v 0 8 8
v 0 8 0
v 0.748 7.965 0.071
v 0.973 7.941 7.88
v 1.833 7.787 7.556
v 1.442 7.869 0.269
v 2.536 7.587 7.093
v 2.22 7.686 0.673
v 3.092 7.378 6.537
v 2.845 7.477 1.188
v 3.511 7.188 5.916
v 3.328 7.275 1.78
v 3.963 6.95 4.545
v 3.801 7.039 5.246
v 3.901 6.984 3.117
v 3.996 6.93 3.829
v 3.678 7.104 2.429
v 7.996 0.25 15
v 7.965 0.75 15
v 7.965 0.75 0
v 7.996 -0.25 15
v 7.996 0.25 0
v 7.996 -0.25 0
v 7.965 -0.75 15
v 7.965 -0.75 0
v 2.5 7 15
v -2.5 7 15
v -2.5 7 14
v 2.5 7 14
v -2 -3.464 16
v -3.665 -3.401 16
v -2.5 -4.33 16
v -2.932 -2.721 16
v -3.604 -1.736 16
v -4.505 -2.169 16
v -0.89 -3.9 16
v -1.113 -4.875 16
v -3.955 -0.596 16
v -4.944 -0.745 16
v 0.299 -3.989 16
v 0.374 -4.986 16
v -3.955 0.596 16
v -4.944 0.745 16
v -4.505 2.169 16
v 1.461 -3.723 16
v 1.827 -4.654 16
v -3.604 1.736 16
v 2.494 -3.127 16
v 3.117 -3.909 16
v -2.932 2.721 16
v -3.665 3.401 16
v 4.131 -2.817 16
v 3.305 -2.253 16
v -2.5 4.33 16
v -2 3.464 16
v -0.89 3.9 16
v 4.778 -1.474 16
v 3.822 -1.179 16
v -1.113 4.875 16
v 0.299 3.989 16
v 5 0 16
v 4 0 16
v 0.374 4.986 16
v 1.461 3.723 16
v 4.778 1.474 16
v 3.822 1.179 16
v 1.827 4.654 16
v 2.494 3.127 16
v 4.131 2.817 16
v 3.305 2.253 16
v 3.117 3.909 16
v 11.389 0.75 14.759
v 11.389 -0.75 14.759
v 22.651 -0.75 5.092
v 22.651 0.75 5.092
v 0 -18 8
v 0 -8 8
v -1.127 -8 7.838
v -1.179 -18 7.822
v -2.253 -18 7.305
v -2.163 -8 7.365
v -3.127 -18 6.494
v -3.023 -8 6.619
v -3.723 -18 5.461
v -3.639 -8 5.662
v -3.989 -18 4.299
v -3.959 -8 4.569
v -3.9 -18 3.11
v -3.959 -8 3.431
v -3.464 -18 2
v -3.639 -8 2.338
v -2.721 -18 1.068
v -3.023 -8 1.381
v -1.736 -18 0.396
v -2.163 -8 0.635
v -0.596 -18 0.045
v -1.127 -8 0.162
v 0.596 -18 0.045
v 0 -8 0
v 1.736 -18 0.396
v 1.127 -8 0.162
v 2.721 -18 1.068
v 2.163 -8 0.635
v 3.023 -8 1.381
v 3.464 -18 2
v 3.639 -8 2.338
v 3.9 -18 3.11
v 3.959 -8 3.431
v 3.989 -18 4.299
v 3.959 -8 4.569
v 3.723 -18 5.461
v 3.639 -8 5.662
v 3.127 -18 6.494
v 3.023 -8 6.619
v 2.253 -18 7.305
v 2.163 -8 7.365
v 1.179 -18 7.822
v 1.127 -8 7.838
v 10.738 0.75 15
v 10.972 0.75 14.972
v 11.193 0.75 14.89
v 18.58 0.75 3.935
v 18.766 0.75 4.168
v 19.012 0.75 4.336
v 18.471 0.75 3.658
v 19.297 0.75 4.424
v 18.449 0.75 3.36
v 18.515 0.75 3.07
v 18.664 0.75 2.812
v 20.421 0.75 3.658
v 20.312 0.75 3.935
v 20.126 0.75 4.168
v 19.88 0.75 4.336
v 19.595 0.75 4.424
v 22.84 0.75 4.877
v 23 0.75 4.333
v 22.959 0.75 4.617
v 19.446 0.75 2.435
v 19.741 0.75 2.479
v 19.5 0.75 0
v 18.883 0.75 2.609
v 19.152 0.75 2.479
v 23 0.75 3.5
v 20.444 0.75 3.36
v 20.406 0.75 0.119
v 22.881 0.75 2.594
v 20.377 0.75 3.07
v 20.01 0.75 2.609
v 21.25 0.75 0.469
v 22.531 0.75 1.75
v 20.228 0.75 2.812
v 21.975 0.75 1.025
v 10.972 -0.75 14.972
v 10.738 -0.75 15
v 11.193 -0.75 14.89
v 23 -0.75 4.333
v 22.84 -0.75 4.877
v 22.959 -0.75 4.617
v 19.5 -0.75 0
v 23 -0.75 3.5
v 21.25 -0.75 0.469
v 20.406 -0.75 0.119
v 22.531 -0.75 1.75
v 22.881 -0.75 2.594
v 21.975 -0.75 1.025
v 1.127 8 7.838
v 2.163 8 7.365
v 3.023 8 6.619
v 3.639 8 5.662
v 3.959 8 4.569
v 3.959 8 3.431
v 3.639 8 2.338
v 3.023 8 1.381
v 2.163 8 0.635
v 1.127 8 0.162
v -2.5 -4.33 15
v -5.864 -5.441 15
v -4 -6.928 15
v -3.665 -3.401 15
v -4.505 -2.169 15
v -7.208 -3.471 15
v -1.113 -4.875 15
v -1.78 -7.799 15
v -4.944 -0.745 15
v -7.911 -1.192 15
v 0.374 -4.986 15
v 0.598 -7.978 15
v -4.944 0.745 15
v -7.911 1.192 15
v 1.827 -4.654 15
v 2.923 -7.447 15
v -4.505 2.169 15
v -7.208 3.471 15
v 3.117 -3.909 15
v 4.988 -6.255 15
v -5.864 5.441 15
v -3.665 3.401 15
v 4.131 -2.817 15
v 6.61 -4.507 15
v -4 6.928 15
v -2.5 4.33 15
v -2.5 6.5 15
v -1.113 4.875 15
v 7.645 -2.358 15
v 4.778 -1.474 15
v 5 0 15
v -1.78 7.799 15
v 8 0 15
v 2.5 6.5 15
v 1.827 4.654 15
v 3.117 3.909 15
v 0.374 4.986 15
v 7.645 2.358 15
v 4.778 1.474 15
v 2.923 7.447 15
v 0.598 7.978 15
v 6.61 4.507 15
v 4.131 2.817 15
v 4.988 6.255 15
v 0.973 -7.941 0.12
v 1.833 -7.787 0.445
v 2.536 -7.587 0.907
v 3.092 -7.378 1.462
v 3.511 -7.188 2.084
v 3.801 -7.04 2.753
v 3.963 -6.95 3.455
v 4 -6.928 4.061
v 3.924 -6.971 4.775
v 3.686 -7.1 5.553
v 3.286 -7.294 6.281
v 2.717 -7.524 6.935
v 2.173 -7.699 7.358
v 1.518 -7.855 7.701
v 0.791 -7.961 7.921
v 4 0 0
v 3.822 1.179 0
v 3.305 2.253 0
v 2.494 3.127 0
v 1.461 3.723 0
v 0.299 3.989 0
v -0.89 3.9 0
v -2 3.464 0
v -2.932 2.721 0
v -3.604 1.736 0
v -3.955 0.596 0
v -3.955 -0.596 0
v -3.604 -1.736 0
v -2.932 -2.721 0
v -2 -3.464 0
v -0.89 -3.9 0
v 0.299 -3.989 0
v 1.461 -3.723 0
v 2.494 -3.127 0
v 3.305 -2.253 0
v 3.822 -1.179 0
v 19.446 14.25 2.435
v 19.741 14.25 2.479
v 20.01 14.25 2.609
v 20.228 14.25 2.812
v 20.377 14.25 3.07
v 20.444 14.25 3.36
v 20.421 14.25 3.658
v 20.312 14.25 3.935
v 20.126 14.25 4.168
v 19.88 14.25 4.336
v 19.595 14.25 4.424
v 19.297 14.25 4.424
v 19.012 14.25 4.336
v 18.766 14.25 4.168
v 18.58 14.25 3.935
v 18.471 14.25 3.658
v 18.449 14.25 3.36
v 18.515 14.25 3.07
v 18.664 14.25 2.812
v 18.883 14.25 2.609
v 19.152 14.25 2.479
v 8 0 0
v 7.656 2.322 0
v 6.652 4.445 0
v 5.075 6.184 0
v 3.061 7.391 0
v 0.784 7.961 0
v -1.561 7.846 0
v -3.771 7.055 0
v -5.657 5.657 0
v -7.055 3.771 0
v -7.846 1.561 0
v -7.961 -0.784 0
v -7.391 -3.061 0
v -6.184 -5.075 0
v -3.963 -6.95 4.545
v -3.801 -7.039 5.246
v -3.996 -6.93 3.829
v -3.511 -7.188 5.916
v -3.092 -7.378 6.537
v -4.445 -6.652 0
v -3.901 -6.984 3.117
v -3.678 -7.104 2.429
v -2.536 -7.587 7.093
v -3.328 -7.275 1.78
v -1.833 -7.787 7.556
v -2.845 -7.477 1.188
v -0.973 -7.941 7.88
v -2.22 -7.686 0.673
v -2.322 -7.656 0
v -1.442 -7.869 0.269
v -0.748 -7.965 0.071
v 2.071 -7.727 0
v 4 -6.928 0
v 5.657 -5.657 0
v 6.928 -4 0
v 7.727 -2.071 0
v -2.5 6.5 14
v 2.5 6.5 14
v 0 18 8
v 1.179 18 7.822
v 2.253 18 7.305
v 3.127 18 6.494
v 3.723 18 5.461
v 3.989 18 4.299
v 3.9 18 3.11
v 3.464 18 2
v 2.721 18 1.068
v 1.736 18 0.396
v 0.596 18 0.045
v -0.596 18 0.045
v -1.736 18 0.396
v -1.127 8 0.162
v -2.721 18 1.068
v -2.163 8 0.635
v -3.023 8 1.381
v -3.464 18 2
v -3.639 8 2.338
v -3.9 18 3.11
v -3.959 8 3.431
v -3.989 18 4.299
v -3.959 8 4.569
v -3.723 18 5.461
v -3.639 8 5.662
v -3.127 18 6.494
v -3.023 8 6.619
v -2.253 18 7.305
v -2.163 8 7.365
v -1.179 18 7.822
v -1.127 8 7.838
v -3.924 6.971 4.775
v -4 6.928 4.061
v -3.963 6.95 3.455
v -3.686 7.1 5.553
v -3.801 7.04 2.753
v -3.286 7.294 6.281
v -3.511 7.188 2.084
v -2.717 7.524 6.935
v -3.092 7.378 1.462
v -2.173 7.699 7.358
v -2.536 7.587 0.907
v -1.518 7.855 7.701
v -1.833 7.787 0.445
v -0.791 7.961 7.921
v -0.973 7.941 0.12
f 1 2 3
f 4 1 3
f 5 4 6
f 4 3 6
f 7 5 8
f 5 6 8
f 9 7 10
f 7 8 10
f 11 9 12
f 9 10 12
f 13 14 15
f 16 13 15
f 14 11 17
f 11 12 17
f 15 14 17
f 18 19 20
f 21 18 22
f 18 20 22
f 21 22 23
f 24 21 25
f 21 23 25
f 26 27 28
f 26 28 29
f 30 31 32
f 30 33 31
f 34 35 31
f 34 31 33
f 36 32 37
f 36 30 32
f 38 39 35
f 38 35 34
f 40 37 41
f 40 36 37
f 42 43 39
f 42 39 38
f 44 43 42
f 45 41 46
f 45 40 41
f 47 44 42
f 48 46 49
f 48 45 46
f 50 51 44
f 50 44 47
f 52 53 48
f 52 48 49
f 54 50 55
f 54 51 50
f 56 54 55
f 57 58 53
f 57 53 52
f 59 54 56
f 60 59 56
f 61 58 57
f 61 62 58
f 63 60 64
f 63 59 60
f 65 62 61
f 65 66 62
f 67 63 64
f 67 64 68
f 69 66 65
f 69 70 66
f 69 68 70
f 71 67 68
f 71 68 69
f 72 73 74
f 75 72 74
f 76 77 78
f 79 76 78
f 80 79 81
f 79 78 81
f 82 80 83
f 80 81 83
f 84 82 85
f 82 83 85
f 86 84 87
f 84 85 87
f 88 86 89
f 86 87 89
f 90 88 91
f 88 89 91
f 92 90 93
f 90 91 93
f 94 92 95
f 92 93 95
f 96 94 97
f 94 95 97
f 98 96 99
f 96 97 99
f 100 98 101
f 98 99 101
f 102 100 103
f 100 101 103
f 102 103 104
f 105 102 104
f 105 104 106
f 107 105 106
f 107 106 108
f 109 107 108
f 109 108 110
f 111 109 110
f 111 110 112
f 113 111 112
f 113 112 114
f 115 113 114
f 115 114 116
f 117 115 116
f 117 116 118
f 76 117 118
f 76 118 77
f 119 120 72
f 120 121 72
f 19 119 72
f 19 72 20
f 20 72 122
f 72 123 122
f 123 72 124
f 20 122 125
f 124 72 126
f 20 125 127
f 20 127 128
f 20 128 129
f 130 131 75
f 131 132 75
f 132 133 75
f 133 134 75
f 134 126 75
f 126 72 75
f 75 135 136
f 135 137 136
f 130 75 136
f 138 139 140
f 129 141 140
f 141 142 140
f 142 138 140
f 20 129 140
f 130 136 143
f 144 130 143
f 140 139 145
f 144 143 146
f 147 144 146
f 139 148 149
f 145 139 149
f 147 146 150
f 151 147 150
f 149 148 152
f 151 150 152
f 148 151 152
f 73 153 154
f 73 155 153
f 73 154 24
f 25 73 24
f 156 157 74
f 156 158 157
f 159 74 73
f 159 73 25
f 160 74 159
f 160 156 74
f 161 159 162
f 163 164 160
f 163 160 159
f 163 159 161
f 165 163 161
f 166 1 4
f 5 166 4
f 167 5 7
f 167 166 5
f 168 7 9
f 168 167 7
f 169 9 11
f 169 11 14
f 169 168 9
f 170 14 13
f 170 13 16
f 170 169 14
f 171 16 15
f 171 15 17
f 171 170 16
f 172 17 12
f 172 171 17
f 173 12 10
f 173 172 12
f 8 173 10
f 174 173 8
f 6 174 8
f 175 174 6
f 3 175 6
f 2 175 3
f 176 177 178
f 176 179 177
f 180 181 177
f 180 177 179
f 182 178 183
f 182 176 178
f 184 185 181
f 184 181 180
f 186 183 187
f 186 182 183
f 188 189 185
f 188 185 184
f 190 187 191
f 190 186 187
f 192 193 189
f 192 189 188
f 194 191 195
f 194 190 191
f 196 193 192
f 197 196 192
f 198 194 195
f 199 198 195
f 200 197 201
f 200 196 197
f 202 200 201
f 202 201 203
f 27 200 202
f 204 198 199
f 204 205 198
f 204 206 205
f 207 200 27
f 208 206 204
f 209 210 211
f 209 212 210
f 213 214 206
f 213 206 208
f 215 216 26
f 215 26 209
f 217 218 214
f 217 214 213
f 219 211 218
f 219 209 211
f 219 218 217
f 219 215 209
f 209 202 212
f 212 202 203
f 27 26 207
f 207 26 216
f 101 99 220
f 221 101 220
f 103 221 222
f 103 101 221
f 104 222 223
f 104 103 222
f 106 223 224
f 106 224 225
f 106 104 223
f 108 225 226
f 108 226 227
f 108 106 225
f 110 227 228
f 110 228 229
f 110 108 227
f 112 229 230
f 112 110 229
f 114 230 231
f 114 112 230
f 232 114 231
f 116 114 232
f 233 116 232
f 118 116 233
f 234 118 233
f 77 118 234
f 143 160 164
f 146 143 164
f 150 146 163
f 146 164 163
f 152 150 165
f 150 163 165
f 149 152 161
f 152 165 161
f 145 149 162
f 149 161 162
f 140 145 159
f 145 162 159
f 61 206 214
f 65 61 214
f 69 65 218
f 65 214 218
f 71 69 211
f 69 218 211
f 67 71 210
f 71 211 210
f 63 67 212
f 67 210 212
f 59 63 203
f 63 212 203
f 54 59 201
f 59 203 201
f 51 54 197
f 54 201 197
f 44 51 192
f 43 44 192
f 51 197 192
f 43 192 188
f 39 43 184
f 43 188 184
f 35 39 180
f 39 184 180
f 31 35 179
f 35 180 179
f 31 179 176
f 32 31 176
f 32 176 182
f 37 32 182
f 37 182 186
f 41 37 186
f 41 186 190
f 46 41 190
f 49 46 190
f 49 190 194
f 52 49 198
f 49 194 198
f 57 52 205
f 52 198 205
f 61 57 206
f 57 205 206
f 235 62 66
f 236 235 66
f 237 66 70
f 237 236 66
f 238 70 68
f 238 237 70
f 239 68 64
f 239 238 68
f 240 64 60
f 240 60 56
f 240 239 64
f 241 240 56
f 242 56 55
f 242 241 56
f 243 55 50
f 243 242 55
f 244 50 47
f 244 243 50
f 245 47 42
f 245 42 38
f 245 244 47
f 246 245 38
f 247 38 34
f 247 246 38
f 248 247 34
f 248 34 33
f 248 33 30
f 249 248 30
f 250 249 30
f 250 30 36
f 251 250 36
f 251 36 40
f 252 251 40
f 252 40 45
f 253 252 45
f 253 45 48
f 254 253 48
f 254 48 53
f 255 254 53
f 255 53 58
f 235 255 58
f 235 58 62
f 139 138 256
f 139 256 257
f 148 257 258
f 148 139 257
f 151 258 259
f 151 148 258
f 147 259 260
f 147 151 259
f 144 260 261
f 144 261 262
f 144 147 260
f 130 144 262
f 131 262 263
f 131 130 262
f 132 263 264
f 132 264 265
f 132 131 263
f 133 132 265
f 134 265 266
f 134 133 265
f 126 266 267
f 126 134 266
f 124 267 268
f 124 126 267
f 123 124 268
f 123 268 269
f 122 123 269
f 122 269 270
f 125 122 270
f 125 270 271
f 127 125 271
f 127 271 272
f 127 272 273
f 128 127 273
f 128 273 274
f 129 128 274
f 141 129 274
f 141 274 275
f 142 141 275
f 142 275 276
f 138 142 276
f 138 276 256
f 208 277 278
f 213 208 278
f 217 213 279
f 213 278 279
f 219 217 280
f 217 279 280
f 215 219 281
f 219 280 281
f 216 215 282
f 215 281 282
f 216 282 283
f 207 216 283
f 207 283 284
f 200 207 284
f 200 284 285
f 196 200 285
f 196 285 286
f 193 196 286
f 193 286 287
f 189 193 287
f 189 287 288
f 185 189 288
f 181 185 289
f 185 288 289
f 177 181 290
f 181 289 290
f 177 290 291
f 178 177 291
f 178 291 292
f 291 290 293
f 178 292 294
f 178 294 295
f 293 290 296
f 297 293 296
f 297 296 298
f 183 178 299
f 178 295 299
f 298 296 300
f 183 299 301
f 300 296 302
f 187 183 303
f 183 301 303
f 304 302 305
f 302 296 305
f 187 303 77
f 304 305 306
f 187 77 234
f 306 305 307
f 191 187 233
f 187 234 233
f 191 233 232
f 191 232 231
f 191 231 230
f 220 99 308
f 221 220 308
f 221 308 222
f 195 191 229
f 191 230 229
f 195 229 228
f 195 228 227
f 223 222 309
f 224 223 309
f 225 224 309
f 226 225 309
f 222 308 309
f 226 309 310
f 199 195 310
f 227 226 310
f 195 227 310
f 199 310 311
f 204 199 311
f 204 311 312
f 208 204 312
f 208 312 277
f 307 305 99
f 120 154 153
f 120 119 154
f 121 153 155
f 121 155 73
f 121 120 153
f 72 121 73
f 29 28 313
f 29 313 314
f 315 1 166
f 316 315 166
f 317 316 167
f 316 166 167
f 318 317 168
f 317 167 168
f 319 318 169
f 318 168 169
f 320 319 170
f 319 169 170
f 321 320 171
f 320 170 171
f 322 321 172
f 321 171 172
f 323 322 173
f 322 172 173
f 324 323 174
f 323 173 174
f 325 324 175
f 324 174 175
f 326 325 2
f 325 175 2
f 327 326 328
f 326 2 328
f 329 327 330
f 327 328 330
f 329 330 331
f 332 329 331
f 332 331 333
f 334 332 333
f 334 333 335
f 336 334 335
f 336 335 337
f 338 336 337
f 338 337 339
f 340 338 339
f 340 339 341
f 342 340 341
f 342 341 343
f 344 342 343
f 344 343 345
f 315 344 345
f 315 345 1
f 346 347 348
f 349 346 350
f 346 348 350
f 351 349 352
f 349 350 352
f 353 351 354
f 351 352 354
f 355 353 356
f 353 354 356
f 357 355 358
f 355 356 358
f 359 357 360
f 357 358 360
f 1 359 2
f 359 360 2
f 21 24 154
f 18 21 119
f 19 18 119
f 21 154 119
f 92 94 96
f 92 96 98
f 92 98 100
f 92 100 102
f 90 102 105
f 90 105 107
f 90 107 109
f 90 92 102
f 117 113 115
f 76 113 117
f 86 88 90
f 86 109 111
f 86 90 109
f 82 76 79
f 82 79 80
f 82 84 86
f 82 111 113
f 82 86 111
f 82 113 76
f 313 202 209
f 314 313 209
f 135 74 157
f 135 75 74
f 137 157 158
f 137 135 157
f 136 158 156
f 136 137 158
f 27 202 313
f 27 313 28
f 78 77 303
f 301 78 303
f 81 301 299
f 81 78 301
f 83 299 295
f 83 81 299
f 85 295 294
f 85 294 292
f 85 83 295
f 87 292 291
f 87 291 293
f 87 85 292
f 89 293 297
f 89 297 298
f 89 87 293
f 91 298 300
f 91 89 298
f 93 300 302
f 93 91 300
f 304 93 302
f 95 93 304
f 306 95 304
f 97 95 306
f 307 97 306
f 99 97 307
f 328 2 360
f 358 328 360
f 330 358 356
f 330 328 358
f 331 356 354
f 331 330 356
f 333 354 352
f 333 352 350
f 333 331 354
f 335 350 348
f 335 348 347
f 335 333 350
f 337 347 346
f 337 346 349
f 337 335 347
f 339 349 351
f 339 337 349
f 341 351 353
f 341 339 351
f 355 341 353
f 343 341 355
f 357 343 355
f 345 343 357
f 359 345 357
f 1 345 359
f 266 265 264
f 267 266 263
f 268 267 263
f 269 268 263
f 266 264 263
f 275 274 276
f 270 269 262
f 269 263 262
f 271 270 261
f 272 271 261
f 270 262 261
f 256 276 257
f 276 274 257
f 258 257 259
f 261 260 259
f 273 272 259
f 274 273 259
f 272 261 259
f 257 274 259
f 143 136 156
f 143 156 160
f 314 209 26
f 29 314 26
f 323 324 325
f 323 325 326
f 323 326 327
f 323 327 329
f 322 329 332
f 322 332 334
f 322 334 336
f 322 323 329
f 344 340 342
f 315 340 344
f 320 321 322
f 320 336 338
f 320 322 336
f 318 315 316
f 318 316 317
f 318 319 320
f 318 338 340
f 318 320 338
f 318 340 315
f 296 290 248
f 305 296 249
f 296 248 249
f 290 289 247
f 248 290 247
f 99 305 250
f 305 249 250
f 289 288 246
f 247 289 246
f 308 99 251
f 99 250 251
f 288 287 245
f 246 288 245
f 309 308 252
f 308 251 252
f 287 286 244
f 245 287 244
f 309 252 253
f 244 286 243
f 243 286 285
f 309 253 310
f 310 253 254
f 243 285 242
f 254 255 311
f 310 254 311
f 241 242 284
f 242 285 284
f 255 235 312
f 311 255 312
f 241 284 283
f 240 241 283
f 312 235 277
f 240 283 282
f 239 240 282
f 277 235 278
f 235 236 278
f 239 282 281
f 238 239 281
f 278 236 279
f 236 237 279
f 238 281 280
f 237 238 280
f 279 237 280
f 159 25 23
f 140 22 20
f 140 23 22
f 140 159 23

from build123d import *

# Parameters (mm, degrees)
SKETCH1_R                            = 8
BOSS_EXTRUDE1_DEPTH                  = 15
SKETCH2_R                            = 5
SKETCH2_R_2                          = 4
BOSS_EXTRUDE2_DEPTH                  = 1
CUT_EXTRUDE1_START                   = -15
SKETCH3_R                            = 4
CUT_EXTRUDE1_DEPTH                   = 15
SKETCH4_R                            = 4
BOSS_EXTRUDE3_DEPTH                  = 10
BOSS_EXTRUDE3_DIRECTION_2_REACH      = 26
BOSS_EXTRUDE3_DIRECTION_2_END_RADIUS = 8
SKETCH6_R                            = 4
BOSS_EXTRUDE4_DEPTH                  = 10
BOSS_EXTRUDE4_DIRECTION_2_REACH      = 33.559
BOSS_EXTRUDE4_DIRECTION_2_END_RADIUS = 8
SKETCH7_W                            = 15
SKETCH7_H                            = 1.5
BOSS_EXTRUDE5_DEPTH                  = 15
BOSS_EXTRUDE5_DIRECTION_2_REACH      = 30.914
BOSS_EXTRUDE5_DIRECTION_2_END_RADIUS = 8
CUT_EXTRUDE2_DEPTH                   = 15
CUT_EXTRUDE3_DEPTH                   = 15
FILLET1_R                            = 1
FILLET2_R                            = 1
SKETCH12_R                           = 1
BOSS_EXTRUDE6_DEPTH                  = 15
SKETCH14_W                           = 5
SKETCH14_H                           = 0.5
CUT_EXTRUDE4_DEPTH                   = 1


with BuildPart() as part:
    # Sketch1 → Boss-Extrude1 (new body)
    with BuildSketch(Plane.XY):
        Circle(SKETCH1_R)
    extrude(amount=BOSS_EXTRUDE1_DEPTH)

    # Sketch2 → Boss-Extrude2 (add)
    with BuildSketch(Plane.XY.offset(15)):
        Circle(SKETCH2_R)
        Circle(SKETCH2_R_2, mode=Mode.SUBTRACT)
    extrude(amount=BOSS_EXTRUDE2_DEPTH)

    # Sketch3 → Cut-Extrude1 (cut)
    with BuildSketch(Plane.XY.offset(15).offset(CUT_EXTRUDE1_START)):
        Circle(SKETCH3_R)
    extrude(amount=CUT_EXTRUDE1_DEPTH, mode=Mode.SUBTRACT)

    # Sketch6 → Boss-Extrude4 (add)
    with BuildSketch(Plane(origin=(0, -8, 0), x_dir=(-1, 0, 0), z_dir=(0, -1, 0))):
        with Locations(Location((0, -4, 0), (0, 0, 270))):
            Circle(SKETCH6_R)
    extrude(amount=BOSS_EXTRUDE4_DEPTH)

    # Boss-Extrude4 direction 2: up to this cylinder (the profile starts outside it)
    boss_extrude4_direction_2_end = Plane(origin=(0, 0, 4), z_dir=(0, 0, -1)) * Cylinder(BOSS_EXTRUDE4_DIRECTION_2_END_RADIUS, 84.118, mode=Mode.PRIVATE)
    # Sketch6 → Boss-Extrude4 direction 2 (add, up to the surface)
    with BuildSketch(Plane(origin=(0, -8, 0), x_dir=(-1, 0, 0), z_dir=(0, -1, 0)), mode=Mode.PRIVATE) as boss_extrude4_direction_2_sk1:
        with Locations(Location((0, -4, 0), (0, 0, 270))):
            Circle(SKETCH6_R)
    boss_extrude4_direction_2_tool1 = extrude(boss_extrude4_direction_2_sk1.sketch, amount=-BOSS_EXTRUDE4_DIRECTION_2_REACH, mode=Mode.PRIVATE) - boss_extrude4_direction_2_end
    add(boss_extrude4_direction_2_tool1.solids().sort_by_distance((0, -8, 4))[0])
    add(boss_extrude4_direction_2_tool1.solids().sort_by_distance((0, -8, 4))[1])

    # Sketch14 → Cut-Extrude4 (cut)
    with BuildSketch(Plane.XY.offset(15)):
        with Locations((0, 6.75)):
            Rectangle(SKETCH14_W, SKETCH14_H)
    extrude(amount=-CUT_EXTRUDE4_DEPTH, mode=Mode.SUBTRACT)


with BuildPart() as body_2:
    # Sketch4 → Boss-Extrude3 (new body)
    with BuildSketch(Plane(origin=(0, 8, 0), x_dir=(1, 0, 0), z_dir=(0, 1, 0))):
        with Locations(Location((0, -4, 0), (0, 0, 270))):
            Circle(SKETCH4_R)
    extrude(amount=BOSS_EXTRUDE3_DEPTH)

    # Boss-Extrude3 direction 2: up to this cylinder (the profile starts outside it)
    boss_extrude3_direction_2_end = Plane(origin=(0, 0, 4), z_dir=(0, 0, -1)) * Cylinder(BOSS_EXTRUDE3_DIRECTION_2_END_RADIUS, 69, mode=Mode.PRIVATE)
    # Sketch4 → Boss-Extrude3 direction 2 (add, up to the surface)
    with BuildSketch(Plane(origin=(0, 8, 0), x_dir=(1, 0, 0), z_dir=(0, 1, 0)), mode=Mode.PRIVATE) as boss_extrude3_direction_2_sk1:
        with Locations(Location((0, -4, 0), (0, 0, 270))):
            Circle(SKETCH4_R)
    boss_extrude3_direction_2_tool1 = extrude(boss_extrude3_direction_2_sk1.sketch, amount=-BOSS_EXTRUDE3_DIRECTION_2_REACH, mode=Mode.PRIVATE) - boss_extrude3_direction_2_end
    add(boss_extrude3_direction_2_tool1.solids().sort_by_distance((0, 8, 4))[0])
    add(boss_extrude3_direction_2_tool1.solids().sort_by_distance((0, 8, 4))[1])


with BuildPart() as body_3:
    # Sketch7 → Boss-Extrude5 (new body)
    with BuildSketch(Plane(origin=(8, 0, 0), x_dir=(0, 0, -1), z_dir=(1, 0, 0))):
        with Locations((-7.5, 0)):
            Rectangle(SKETCH7_W, SKETCH7_H)
    extrude(amount=BOSS_EXTRUDE5_DEPTH)

    # Boss-Extrude5 direction 2: up to this cylinder (the profile starts outside it)
    boss_extrude5_direction_2_end = Plane(origin=(0, 0, 7.5), z_dir=(0, 0, -1)) * Cylinder(BOSS_EXTRUDE5_DIRECTION_2_END_RADIUS, 78.828, mode=Mode.PRIVATE)
    # Sketch7 → Boss-Extrude5 direction 2 (add, up to the surface)
    with BuildSketch(Plane(origin=(8, 0, 0), x_dir=(0, 0, -1), z_dir=(1, 0, 0)), mode=Mode.PRIVATE) as boss_extrude5_direction_2_sk1:
        with Locations((-7.5, 0)):
            Rectangle(SKETCH7_W, SKETCH7_H)
    boss_extrude5_direction_2_tool1 = extrude(boss_extrude5_direction_2_sk1.sketch, amount=-BOSS_EXTRUDE5_DIRECTION_2_REACH, mode=Mode.PRIVATE) - boss_extrude5_direction_2_end
    add(boss_extrude5_direction_2_tool1.solids().sort_by_distance((8, 0, 7.5))[0])
    add(boss_extrude5_direction_2_tool1.solids().sort_by_distance((8, 0, 7.5))[1])

    # Sketch9 → Cut-Extrude2 (cut)
    with BuildSketch(Plane.XZ.offset(0.75)):
        with BuildLine():
            ThreePointArc((23, 3.5), (21.974873734, 1.025126266), (19.5, 0))
            Line((19.5, 0), (23, 0))
            Line((23, 0), (23, 3.5))
        make_face()
    extrude(amount=-CUT_EXTRUDE2_DEPTH, mode=Mode.SUBTRACT)

    # Sketch11 → Cut-Extrude3 (cut)
    with BuildSketch(Plane(origin=(0, -0.75, 0), x_dir=(-1, 0, 0), z_dir=(0, -1, 0))):
        Polygon((-23, -15), (-11.108053079, -15), (-23, -4.792841708), align=None)
    extrude(amount=-CUT_EXTRUDE3_DEPTH, mode=Mode.SUBTRACT)

    # Fillet1
    fillet1_edges = [body_3.edges().sort_by_distance(p)[0] for p in [
        (11.108053079, 0, 15),
    ]]
    fillet(fillet1_edges, radius=FILLET1_R)

    # Fillet2
    fillet2_edges = [body_3.edges().sort_by_distance(p)[0] for p in [
        (23, 0, 4.792841708),
    ]]
    fillet(fillet2_edges, radius=FILLET2_R)

    # Sketch12 → Boss-Extrude6 (add)
    with BuildSketch(Plane.XZ.offset(0.75)):
        with Locations(Location((19.446318933, 3.434994956, 0), (0, 0, 270))):
            Circle(SKETCH12_R)
    extrude(amount=-BOSS_EXTRUDE6_DEPTH)


solid = Compound([part.part, body_2.part, body_3.part])
